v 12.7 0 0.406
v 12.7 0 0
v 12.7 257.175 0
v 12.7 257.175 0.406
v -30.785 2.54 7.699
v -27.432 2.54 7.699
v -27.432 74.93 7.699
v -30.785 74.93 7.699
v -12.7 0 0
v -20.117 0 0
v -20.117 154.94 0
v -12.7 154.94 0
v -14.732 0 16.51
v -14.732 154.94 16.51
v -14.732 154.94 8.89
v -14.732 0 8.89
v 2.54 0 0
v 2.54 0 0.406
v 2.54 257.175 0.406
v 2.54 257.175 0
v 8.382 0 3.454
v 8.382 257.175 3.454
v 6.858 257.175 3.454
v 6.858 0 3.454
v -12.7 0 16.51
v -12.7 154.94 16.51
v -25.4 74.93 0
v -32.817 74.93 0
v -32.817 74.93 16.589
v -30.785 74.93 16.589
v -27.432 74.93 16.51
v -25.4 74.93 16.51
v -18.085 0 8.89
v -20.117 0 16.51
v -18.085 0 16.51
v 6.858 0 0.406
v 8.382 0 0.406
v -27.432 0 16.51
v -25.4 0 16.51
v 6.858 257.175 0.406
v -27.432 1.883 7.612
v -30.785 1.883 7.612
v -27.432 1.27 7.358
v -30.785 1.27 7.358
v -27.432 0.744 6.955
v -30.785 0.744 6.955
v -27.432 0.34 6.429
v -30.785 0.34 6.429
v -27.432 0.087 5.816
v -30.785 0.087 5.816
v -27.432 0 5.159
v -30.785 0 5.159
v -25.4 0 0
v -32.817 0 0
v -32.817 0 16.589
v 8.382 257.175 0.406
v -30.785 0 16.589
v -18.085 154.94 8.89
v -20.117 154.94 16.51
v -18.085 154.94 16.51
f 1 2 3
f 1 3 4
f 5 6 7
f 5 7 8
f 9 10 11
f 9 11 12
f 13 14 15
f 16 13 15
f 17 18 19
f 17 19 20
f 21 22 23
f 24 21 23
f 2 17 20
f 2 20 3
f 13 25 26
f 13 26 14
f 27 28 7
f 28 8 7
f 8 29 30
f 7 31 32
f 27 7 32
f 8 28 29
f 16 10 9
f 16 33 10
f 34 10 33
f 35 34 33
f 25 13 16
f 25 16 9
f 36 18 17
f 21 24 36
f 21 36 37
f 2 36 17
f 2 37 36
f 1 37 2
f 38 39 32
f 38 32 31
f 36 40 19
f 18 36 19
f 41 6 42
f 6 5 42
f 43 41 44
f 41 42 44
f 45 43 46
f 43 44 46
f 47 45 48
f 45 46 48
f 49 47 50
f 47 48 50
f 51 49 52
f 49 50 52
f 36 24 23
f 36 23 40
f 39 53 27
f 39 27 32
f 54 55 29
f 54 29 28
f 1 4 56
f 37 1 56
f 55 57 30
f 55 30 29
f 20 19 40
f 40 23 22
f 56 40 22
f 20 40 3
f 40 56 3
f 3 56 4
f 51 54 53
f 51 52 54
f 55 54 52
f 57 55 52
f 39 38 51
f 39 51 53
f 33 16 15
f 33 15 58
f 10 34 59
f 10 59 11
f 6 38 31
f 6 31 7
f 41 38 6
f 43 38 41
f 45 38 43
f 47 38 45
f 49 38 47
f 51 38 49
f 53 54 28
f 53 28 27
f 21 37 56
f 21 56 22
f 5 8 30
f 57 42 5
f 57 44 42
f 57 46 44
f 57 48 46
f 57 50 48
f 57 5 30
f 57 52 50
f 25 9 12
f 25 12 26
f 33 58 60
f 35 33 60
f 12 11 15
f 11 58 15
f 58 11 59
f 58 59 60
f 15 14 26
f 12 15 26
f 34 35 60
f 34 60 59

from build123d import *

# Parameters (mm, degrees)
F1_DEPTH = 154.94
F3_DEPTH = 74.93
F4_R     = 2.54
F6_DEPTH = 257.175


with BuildPart() as f1:
    # F0 (on Front) → F1 (new body)
    with BuildSketch(Plane.XZ):
        Polygon((-20.1168, 0), (-12.7, 0), (-12.7, 16.51), (-14.732, 16.51), (-14.732, 8.89), (-18.0848, 8.89), (-18.0848, 16.51), (-20.1168, 16.51), align=None)
    extrude(amount=-F1_DEPTH)


with BuildPart() as f3:
    # F2 (on Front) → F3 (new body)
    with BuildSketch(Plane.XZ):
        Polygon((-32.8168, 0), (-25.4, 0), (-25.4, 16.51), (-27.432, 16.51), (-27.432, 7.69853), (-30.7848, 7.69853), (-30.7848, 16.58853), (-32.8168, 16.58853), align=None)
    extrude(amount=-F3_DEPTH)

    # F4
    f4_edges = [f3.edges().sort_by_distance(p)[0] for p in [
        (-29.1084, 0, 7.69853),
    ]]
    fillet(f4_edges, radius=F4_R)


with BuildPart() as f6:
    # F5 (on Front) → F6 (new body)
    with BuildSketch(Plane.XZ):
        Polygon((2.54, 0.4064), (2.54, 0), (12.7, 0), (12.7, 0.4064), (8.382, 0.4064), (8.382, 3.4544), (6.858, 3.4544), (6.858, 0.4064), align=None)
    extrude(amount=-F6_DEPTH)


solid = Compound([f1.part, f3.part, f6.part])
